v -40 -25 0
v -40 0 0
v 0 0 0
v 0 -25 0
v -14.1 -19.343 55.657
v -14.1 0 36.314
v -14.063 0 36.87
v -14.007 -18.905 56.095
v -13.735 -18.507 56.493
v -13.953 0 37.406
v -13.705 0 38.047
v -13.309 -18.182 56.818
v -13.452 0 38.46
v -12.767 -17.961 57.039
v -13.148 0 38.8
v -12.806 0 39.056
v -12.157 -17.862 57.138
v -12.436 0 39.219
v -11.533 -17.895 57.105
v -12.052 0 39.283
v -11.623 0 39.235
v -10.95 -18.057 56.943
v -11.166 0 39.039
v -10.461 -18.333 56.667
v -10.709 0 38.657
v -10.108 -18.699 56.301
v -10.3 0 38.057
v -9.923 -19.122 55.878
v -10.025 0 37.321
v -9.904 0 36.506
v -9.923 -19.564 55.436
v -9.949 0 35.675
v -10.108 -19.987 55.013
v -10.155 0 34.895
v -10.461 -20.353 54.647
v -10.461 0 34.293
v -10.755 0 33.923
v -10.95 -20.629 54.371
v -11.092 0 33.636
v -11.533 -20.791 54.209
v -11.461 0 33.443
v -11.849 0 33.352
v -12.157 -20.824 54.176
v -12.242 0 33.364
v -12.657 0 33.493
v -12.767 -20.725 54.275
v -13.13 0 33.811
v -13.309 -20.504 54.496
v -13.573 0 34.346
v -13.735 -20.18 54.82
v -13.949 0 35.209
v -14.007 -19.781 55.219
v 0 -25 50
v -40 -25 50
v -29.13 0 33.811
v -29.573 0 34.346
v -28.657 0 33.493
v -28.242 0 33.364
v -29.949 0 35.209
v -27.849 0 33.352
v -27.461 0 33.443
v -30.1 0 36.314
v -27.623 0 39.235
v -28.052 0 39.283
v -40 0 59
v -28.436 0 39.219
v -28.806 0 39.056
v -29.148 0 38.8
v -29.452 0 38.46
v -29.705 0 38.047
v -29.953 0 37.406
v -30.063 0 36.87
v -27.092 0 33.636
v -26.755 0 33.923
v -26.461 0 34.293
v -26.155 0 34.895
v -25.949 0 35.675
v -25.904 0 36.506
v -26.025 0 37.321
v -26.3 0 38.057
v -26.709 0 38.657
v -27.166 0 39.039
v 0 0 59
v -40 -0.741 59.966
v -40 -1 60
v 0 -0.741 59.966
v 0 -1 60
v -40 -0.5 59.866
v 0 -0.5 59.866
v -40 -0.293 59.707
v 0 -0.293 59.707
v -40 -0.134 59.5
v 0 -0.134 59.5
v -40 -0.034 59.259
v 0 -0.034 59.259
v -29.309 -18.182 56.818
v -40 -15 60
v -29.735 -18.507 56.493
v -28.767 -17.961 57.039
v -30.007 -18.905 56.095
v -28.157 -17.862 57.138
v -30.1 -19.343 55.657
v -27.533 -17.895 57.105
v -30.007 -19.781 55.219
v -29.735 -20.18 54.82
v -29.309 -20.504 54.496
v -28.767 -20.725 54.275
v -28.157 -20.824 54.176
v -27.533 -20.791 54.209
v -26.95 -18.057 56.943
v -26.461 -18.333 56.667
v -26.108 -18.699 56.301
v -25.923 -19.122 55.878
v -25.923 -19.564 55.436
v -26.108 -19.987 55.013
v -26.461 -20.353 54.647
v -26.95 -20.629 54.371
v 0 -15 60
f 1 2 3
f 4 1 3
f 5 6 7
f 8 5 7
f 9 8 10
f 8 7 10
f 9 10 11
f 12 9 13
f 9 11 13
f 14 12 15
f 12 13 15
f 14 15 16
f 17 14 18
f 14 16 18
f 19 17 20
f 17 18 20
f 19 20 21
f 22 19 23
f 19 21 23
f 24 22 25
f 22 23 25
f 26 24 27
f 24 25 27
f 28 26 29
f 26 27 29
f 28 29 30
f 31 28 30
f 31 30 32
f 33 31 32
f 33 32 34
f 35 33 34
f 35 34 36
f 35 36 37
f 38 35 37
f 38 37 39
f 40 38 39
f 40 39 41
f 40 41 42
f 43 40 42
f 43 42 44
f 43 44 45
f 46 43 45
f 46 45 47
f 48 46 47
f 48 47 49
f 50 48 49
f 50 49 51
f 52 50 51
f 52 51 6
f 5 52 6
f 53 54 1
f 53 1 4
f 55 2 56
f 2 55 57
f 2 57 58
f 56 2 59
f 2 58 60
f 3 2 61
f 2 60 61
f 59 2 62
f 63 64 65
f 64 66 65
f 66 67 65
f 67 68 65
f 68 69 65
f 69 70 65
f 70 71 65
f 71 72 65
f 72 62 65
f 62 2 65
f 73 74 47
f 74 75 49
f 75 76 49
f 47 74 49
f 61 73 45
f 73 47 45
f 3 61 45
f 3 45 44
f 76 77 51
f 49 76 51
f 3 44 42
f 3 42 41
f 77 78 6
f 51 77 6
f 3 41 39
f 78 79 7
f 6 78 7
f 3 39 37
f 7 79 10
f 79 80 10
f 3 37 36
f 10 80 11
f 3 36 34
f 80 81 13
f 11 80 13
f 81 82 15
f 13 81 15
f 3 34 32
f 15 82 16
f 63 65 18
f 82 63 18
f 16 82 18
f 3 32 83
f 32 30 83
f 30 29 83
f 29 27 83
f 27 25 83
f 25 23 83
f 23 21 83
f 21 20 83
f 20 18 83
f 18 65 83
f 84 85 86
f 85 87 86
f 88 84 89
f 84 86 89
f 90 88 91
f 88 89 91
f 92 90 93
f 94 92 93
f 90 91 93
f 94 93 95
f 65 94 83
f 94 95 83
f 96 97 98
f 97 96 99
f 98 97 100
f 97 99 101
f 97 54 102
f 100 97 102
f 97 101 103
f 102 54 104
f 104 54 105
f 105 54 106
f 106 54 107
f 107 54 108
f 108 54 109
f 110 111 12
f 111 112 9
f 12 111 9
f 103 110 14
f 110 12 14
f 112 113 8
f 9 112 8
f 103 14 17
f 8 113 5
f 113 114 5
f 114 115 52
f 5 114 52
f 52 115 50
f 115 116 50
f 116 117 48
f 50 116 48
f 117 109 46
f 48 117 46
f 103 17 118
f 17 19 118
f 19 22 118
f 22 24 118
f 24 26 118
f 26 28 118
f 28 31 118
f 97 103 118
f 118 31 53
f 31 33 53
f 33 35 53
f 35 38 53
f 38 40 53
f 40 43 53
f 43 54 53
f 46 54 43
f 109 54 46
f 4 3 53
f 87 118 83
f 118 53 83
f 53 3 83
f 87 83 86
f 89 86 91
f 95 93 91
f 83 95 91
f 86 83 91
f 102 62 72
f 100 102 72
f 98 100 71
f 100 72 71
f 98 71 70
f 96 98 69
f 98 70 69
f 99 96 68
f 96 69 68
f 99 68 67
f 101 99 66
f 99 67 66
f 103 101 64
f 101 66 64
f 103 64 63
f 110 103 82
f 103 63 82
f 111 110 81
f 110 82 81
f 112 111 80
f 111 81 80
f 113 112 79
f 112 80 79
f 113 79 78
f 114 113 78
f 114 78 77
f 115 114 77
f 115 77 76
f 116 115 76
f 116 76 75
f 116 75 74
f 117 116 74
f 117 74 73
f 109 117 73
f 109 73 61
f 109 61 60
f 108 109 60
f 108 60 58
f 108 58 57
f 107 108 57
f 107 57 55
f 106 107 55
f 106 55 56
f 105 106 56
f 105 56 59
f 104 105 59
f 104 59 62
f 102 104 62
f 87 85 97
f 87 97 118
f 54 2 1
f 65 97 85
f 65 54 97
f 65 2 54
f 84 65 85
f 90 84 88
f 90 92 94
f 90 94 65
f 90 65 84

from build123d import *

# Parameters (mm, degrees)
F0_W     = 40
F0_H     = 60
F1_DEPTH = 25
F2_SIZE  = 10
F4_D     = 4.2
F5_R     = 1


with BuildPart() as f1:
    # F0 (on Front) → F1 (new body)
    with BuildSketch(Plane.XZ):
        with Locations((-20, 30)):
            Rectangle(F0_W, F0_H)
    extrude(amount=F1_DEPTH)

    # F2
    f2_edges = [f1.edges().sort_by_distance(p)[0] for p in [
        (-20, -25, 60),
    ]]
    chamfer(f2_edges, length=F2_SIZE)

    # F4 (through all)
    with Locations(Plane(origin=(0, -37.5, 37.5), x_dir=(1, 0, 0), z_dir=(0, -0.7071067812, 0.7071067812))):
        with Locations((-12, 25.6776695297), (-28, 25.6776695297)):
            Hole(F4_D / 2)

    # F5
    f5_edges = [f1.edges().sort_by_distance(p)[0] for p in [
        (-20, 0, 60),
    ]]
    fillet(f5_edges, radius=F5_R)


solid = f1.part
